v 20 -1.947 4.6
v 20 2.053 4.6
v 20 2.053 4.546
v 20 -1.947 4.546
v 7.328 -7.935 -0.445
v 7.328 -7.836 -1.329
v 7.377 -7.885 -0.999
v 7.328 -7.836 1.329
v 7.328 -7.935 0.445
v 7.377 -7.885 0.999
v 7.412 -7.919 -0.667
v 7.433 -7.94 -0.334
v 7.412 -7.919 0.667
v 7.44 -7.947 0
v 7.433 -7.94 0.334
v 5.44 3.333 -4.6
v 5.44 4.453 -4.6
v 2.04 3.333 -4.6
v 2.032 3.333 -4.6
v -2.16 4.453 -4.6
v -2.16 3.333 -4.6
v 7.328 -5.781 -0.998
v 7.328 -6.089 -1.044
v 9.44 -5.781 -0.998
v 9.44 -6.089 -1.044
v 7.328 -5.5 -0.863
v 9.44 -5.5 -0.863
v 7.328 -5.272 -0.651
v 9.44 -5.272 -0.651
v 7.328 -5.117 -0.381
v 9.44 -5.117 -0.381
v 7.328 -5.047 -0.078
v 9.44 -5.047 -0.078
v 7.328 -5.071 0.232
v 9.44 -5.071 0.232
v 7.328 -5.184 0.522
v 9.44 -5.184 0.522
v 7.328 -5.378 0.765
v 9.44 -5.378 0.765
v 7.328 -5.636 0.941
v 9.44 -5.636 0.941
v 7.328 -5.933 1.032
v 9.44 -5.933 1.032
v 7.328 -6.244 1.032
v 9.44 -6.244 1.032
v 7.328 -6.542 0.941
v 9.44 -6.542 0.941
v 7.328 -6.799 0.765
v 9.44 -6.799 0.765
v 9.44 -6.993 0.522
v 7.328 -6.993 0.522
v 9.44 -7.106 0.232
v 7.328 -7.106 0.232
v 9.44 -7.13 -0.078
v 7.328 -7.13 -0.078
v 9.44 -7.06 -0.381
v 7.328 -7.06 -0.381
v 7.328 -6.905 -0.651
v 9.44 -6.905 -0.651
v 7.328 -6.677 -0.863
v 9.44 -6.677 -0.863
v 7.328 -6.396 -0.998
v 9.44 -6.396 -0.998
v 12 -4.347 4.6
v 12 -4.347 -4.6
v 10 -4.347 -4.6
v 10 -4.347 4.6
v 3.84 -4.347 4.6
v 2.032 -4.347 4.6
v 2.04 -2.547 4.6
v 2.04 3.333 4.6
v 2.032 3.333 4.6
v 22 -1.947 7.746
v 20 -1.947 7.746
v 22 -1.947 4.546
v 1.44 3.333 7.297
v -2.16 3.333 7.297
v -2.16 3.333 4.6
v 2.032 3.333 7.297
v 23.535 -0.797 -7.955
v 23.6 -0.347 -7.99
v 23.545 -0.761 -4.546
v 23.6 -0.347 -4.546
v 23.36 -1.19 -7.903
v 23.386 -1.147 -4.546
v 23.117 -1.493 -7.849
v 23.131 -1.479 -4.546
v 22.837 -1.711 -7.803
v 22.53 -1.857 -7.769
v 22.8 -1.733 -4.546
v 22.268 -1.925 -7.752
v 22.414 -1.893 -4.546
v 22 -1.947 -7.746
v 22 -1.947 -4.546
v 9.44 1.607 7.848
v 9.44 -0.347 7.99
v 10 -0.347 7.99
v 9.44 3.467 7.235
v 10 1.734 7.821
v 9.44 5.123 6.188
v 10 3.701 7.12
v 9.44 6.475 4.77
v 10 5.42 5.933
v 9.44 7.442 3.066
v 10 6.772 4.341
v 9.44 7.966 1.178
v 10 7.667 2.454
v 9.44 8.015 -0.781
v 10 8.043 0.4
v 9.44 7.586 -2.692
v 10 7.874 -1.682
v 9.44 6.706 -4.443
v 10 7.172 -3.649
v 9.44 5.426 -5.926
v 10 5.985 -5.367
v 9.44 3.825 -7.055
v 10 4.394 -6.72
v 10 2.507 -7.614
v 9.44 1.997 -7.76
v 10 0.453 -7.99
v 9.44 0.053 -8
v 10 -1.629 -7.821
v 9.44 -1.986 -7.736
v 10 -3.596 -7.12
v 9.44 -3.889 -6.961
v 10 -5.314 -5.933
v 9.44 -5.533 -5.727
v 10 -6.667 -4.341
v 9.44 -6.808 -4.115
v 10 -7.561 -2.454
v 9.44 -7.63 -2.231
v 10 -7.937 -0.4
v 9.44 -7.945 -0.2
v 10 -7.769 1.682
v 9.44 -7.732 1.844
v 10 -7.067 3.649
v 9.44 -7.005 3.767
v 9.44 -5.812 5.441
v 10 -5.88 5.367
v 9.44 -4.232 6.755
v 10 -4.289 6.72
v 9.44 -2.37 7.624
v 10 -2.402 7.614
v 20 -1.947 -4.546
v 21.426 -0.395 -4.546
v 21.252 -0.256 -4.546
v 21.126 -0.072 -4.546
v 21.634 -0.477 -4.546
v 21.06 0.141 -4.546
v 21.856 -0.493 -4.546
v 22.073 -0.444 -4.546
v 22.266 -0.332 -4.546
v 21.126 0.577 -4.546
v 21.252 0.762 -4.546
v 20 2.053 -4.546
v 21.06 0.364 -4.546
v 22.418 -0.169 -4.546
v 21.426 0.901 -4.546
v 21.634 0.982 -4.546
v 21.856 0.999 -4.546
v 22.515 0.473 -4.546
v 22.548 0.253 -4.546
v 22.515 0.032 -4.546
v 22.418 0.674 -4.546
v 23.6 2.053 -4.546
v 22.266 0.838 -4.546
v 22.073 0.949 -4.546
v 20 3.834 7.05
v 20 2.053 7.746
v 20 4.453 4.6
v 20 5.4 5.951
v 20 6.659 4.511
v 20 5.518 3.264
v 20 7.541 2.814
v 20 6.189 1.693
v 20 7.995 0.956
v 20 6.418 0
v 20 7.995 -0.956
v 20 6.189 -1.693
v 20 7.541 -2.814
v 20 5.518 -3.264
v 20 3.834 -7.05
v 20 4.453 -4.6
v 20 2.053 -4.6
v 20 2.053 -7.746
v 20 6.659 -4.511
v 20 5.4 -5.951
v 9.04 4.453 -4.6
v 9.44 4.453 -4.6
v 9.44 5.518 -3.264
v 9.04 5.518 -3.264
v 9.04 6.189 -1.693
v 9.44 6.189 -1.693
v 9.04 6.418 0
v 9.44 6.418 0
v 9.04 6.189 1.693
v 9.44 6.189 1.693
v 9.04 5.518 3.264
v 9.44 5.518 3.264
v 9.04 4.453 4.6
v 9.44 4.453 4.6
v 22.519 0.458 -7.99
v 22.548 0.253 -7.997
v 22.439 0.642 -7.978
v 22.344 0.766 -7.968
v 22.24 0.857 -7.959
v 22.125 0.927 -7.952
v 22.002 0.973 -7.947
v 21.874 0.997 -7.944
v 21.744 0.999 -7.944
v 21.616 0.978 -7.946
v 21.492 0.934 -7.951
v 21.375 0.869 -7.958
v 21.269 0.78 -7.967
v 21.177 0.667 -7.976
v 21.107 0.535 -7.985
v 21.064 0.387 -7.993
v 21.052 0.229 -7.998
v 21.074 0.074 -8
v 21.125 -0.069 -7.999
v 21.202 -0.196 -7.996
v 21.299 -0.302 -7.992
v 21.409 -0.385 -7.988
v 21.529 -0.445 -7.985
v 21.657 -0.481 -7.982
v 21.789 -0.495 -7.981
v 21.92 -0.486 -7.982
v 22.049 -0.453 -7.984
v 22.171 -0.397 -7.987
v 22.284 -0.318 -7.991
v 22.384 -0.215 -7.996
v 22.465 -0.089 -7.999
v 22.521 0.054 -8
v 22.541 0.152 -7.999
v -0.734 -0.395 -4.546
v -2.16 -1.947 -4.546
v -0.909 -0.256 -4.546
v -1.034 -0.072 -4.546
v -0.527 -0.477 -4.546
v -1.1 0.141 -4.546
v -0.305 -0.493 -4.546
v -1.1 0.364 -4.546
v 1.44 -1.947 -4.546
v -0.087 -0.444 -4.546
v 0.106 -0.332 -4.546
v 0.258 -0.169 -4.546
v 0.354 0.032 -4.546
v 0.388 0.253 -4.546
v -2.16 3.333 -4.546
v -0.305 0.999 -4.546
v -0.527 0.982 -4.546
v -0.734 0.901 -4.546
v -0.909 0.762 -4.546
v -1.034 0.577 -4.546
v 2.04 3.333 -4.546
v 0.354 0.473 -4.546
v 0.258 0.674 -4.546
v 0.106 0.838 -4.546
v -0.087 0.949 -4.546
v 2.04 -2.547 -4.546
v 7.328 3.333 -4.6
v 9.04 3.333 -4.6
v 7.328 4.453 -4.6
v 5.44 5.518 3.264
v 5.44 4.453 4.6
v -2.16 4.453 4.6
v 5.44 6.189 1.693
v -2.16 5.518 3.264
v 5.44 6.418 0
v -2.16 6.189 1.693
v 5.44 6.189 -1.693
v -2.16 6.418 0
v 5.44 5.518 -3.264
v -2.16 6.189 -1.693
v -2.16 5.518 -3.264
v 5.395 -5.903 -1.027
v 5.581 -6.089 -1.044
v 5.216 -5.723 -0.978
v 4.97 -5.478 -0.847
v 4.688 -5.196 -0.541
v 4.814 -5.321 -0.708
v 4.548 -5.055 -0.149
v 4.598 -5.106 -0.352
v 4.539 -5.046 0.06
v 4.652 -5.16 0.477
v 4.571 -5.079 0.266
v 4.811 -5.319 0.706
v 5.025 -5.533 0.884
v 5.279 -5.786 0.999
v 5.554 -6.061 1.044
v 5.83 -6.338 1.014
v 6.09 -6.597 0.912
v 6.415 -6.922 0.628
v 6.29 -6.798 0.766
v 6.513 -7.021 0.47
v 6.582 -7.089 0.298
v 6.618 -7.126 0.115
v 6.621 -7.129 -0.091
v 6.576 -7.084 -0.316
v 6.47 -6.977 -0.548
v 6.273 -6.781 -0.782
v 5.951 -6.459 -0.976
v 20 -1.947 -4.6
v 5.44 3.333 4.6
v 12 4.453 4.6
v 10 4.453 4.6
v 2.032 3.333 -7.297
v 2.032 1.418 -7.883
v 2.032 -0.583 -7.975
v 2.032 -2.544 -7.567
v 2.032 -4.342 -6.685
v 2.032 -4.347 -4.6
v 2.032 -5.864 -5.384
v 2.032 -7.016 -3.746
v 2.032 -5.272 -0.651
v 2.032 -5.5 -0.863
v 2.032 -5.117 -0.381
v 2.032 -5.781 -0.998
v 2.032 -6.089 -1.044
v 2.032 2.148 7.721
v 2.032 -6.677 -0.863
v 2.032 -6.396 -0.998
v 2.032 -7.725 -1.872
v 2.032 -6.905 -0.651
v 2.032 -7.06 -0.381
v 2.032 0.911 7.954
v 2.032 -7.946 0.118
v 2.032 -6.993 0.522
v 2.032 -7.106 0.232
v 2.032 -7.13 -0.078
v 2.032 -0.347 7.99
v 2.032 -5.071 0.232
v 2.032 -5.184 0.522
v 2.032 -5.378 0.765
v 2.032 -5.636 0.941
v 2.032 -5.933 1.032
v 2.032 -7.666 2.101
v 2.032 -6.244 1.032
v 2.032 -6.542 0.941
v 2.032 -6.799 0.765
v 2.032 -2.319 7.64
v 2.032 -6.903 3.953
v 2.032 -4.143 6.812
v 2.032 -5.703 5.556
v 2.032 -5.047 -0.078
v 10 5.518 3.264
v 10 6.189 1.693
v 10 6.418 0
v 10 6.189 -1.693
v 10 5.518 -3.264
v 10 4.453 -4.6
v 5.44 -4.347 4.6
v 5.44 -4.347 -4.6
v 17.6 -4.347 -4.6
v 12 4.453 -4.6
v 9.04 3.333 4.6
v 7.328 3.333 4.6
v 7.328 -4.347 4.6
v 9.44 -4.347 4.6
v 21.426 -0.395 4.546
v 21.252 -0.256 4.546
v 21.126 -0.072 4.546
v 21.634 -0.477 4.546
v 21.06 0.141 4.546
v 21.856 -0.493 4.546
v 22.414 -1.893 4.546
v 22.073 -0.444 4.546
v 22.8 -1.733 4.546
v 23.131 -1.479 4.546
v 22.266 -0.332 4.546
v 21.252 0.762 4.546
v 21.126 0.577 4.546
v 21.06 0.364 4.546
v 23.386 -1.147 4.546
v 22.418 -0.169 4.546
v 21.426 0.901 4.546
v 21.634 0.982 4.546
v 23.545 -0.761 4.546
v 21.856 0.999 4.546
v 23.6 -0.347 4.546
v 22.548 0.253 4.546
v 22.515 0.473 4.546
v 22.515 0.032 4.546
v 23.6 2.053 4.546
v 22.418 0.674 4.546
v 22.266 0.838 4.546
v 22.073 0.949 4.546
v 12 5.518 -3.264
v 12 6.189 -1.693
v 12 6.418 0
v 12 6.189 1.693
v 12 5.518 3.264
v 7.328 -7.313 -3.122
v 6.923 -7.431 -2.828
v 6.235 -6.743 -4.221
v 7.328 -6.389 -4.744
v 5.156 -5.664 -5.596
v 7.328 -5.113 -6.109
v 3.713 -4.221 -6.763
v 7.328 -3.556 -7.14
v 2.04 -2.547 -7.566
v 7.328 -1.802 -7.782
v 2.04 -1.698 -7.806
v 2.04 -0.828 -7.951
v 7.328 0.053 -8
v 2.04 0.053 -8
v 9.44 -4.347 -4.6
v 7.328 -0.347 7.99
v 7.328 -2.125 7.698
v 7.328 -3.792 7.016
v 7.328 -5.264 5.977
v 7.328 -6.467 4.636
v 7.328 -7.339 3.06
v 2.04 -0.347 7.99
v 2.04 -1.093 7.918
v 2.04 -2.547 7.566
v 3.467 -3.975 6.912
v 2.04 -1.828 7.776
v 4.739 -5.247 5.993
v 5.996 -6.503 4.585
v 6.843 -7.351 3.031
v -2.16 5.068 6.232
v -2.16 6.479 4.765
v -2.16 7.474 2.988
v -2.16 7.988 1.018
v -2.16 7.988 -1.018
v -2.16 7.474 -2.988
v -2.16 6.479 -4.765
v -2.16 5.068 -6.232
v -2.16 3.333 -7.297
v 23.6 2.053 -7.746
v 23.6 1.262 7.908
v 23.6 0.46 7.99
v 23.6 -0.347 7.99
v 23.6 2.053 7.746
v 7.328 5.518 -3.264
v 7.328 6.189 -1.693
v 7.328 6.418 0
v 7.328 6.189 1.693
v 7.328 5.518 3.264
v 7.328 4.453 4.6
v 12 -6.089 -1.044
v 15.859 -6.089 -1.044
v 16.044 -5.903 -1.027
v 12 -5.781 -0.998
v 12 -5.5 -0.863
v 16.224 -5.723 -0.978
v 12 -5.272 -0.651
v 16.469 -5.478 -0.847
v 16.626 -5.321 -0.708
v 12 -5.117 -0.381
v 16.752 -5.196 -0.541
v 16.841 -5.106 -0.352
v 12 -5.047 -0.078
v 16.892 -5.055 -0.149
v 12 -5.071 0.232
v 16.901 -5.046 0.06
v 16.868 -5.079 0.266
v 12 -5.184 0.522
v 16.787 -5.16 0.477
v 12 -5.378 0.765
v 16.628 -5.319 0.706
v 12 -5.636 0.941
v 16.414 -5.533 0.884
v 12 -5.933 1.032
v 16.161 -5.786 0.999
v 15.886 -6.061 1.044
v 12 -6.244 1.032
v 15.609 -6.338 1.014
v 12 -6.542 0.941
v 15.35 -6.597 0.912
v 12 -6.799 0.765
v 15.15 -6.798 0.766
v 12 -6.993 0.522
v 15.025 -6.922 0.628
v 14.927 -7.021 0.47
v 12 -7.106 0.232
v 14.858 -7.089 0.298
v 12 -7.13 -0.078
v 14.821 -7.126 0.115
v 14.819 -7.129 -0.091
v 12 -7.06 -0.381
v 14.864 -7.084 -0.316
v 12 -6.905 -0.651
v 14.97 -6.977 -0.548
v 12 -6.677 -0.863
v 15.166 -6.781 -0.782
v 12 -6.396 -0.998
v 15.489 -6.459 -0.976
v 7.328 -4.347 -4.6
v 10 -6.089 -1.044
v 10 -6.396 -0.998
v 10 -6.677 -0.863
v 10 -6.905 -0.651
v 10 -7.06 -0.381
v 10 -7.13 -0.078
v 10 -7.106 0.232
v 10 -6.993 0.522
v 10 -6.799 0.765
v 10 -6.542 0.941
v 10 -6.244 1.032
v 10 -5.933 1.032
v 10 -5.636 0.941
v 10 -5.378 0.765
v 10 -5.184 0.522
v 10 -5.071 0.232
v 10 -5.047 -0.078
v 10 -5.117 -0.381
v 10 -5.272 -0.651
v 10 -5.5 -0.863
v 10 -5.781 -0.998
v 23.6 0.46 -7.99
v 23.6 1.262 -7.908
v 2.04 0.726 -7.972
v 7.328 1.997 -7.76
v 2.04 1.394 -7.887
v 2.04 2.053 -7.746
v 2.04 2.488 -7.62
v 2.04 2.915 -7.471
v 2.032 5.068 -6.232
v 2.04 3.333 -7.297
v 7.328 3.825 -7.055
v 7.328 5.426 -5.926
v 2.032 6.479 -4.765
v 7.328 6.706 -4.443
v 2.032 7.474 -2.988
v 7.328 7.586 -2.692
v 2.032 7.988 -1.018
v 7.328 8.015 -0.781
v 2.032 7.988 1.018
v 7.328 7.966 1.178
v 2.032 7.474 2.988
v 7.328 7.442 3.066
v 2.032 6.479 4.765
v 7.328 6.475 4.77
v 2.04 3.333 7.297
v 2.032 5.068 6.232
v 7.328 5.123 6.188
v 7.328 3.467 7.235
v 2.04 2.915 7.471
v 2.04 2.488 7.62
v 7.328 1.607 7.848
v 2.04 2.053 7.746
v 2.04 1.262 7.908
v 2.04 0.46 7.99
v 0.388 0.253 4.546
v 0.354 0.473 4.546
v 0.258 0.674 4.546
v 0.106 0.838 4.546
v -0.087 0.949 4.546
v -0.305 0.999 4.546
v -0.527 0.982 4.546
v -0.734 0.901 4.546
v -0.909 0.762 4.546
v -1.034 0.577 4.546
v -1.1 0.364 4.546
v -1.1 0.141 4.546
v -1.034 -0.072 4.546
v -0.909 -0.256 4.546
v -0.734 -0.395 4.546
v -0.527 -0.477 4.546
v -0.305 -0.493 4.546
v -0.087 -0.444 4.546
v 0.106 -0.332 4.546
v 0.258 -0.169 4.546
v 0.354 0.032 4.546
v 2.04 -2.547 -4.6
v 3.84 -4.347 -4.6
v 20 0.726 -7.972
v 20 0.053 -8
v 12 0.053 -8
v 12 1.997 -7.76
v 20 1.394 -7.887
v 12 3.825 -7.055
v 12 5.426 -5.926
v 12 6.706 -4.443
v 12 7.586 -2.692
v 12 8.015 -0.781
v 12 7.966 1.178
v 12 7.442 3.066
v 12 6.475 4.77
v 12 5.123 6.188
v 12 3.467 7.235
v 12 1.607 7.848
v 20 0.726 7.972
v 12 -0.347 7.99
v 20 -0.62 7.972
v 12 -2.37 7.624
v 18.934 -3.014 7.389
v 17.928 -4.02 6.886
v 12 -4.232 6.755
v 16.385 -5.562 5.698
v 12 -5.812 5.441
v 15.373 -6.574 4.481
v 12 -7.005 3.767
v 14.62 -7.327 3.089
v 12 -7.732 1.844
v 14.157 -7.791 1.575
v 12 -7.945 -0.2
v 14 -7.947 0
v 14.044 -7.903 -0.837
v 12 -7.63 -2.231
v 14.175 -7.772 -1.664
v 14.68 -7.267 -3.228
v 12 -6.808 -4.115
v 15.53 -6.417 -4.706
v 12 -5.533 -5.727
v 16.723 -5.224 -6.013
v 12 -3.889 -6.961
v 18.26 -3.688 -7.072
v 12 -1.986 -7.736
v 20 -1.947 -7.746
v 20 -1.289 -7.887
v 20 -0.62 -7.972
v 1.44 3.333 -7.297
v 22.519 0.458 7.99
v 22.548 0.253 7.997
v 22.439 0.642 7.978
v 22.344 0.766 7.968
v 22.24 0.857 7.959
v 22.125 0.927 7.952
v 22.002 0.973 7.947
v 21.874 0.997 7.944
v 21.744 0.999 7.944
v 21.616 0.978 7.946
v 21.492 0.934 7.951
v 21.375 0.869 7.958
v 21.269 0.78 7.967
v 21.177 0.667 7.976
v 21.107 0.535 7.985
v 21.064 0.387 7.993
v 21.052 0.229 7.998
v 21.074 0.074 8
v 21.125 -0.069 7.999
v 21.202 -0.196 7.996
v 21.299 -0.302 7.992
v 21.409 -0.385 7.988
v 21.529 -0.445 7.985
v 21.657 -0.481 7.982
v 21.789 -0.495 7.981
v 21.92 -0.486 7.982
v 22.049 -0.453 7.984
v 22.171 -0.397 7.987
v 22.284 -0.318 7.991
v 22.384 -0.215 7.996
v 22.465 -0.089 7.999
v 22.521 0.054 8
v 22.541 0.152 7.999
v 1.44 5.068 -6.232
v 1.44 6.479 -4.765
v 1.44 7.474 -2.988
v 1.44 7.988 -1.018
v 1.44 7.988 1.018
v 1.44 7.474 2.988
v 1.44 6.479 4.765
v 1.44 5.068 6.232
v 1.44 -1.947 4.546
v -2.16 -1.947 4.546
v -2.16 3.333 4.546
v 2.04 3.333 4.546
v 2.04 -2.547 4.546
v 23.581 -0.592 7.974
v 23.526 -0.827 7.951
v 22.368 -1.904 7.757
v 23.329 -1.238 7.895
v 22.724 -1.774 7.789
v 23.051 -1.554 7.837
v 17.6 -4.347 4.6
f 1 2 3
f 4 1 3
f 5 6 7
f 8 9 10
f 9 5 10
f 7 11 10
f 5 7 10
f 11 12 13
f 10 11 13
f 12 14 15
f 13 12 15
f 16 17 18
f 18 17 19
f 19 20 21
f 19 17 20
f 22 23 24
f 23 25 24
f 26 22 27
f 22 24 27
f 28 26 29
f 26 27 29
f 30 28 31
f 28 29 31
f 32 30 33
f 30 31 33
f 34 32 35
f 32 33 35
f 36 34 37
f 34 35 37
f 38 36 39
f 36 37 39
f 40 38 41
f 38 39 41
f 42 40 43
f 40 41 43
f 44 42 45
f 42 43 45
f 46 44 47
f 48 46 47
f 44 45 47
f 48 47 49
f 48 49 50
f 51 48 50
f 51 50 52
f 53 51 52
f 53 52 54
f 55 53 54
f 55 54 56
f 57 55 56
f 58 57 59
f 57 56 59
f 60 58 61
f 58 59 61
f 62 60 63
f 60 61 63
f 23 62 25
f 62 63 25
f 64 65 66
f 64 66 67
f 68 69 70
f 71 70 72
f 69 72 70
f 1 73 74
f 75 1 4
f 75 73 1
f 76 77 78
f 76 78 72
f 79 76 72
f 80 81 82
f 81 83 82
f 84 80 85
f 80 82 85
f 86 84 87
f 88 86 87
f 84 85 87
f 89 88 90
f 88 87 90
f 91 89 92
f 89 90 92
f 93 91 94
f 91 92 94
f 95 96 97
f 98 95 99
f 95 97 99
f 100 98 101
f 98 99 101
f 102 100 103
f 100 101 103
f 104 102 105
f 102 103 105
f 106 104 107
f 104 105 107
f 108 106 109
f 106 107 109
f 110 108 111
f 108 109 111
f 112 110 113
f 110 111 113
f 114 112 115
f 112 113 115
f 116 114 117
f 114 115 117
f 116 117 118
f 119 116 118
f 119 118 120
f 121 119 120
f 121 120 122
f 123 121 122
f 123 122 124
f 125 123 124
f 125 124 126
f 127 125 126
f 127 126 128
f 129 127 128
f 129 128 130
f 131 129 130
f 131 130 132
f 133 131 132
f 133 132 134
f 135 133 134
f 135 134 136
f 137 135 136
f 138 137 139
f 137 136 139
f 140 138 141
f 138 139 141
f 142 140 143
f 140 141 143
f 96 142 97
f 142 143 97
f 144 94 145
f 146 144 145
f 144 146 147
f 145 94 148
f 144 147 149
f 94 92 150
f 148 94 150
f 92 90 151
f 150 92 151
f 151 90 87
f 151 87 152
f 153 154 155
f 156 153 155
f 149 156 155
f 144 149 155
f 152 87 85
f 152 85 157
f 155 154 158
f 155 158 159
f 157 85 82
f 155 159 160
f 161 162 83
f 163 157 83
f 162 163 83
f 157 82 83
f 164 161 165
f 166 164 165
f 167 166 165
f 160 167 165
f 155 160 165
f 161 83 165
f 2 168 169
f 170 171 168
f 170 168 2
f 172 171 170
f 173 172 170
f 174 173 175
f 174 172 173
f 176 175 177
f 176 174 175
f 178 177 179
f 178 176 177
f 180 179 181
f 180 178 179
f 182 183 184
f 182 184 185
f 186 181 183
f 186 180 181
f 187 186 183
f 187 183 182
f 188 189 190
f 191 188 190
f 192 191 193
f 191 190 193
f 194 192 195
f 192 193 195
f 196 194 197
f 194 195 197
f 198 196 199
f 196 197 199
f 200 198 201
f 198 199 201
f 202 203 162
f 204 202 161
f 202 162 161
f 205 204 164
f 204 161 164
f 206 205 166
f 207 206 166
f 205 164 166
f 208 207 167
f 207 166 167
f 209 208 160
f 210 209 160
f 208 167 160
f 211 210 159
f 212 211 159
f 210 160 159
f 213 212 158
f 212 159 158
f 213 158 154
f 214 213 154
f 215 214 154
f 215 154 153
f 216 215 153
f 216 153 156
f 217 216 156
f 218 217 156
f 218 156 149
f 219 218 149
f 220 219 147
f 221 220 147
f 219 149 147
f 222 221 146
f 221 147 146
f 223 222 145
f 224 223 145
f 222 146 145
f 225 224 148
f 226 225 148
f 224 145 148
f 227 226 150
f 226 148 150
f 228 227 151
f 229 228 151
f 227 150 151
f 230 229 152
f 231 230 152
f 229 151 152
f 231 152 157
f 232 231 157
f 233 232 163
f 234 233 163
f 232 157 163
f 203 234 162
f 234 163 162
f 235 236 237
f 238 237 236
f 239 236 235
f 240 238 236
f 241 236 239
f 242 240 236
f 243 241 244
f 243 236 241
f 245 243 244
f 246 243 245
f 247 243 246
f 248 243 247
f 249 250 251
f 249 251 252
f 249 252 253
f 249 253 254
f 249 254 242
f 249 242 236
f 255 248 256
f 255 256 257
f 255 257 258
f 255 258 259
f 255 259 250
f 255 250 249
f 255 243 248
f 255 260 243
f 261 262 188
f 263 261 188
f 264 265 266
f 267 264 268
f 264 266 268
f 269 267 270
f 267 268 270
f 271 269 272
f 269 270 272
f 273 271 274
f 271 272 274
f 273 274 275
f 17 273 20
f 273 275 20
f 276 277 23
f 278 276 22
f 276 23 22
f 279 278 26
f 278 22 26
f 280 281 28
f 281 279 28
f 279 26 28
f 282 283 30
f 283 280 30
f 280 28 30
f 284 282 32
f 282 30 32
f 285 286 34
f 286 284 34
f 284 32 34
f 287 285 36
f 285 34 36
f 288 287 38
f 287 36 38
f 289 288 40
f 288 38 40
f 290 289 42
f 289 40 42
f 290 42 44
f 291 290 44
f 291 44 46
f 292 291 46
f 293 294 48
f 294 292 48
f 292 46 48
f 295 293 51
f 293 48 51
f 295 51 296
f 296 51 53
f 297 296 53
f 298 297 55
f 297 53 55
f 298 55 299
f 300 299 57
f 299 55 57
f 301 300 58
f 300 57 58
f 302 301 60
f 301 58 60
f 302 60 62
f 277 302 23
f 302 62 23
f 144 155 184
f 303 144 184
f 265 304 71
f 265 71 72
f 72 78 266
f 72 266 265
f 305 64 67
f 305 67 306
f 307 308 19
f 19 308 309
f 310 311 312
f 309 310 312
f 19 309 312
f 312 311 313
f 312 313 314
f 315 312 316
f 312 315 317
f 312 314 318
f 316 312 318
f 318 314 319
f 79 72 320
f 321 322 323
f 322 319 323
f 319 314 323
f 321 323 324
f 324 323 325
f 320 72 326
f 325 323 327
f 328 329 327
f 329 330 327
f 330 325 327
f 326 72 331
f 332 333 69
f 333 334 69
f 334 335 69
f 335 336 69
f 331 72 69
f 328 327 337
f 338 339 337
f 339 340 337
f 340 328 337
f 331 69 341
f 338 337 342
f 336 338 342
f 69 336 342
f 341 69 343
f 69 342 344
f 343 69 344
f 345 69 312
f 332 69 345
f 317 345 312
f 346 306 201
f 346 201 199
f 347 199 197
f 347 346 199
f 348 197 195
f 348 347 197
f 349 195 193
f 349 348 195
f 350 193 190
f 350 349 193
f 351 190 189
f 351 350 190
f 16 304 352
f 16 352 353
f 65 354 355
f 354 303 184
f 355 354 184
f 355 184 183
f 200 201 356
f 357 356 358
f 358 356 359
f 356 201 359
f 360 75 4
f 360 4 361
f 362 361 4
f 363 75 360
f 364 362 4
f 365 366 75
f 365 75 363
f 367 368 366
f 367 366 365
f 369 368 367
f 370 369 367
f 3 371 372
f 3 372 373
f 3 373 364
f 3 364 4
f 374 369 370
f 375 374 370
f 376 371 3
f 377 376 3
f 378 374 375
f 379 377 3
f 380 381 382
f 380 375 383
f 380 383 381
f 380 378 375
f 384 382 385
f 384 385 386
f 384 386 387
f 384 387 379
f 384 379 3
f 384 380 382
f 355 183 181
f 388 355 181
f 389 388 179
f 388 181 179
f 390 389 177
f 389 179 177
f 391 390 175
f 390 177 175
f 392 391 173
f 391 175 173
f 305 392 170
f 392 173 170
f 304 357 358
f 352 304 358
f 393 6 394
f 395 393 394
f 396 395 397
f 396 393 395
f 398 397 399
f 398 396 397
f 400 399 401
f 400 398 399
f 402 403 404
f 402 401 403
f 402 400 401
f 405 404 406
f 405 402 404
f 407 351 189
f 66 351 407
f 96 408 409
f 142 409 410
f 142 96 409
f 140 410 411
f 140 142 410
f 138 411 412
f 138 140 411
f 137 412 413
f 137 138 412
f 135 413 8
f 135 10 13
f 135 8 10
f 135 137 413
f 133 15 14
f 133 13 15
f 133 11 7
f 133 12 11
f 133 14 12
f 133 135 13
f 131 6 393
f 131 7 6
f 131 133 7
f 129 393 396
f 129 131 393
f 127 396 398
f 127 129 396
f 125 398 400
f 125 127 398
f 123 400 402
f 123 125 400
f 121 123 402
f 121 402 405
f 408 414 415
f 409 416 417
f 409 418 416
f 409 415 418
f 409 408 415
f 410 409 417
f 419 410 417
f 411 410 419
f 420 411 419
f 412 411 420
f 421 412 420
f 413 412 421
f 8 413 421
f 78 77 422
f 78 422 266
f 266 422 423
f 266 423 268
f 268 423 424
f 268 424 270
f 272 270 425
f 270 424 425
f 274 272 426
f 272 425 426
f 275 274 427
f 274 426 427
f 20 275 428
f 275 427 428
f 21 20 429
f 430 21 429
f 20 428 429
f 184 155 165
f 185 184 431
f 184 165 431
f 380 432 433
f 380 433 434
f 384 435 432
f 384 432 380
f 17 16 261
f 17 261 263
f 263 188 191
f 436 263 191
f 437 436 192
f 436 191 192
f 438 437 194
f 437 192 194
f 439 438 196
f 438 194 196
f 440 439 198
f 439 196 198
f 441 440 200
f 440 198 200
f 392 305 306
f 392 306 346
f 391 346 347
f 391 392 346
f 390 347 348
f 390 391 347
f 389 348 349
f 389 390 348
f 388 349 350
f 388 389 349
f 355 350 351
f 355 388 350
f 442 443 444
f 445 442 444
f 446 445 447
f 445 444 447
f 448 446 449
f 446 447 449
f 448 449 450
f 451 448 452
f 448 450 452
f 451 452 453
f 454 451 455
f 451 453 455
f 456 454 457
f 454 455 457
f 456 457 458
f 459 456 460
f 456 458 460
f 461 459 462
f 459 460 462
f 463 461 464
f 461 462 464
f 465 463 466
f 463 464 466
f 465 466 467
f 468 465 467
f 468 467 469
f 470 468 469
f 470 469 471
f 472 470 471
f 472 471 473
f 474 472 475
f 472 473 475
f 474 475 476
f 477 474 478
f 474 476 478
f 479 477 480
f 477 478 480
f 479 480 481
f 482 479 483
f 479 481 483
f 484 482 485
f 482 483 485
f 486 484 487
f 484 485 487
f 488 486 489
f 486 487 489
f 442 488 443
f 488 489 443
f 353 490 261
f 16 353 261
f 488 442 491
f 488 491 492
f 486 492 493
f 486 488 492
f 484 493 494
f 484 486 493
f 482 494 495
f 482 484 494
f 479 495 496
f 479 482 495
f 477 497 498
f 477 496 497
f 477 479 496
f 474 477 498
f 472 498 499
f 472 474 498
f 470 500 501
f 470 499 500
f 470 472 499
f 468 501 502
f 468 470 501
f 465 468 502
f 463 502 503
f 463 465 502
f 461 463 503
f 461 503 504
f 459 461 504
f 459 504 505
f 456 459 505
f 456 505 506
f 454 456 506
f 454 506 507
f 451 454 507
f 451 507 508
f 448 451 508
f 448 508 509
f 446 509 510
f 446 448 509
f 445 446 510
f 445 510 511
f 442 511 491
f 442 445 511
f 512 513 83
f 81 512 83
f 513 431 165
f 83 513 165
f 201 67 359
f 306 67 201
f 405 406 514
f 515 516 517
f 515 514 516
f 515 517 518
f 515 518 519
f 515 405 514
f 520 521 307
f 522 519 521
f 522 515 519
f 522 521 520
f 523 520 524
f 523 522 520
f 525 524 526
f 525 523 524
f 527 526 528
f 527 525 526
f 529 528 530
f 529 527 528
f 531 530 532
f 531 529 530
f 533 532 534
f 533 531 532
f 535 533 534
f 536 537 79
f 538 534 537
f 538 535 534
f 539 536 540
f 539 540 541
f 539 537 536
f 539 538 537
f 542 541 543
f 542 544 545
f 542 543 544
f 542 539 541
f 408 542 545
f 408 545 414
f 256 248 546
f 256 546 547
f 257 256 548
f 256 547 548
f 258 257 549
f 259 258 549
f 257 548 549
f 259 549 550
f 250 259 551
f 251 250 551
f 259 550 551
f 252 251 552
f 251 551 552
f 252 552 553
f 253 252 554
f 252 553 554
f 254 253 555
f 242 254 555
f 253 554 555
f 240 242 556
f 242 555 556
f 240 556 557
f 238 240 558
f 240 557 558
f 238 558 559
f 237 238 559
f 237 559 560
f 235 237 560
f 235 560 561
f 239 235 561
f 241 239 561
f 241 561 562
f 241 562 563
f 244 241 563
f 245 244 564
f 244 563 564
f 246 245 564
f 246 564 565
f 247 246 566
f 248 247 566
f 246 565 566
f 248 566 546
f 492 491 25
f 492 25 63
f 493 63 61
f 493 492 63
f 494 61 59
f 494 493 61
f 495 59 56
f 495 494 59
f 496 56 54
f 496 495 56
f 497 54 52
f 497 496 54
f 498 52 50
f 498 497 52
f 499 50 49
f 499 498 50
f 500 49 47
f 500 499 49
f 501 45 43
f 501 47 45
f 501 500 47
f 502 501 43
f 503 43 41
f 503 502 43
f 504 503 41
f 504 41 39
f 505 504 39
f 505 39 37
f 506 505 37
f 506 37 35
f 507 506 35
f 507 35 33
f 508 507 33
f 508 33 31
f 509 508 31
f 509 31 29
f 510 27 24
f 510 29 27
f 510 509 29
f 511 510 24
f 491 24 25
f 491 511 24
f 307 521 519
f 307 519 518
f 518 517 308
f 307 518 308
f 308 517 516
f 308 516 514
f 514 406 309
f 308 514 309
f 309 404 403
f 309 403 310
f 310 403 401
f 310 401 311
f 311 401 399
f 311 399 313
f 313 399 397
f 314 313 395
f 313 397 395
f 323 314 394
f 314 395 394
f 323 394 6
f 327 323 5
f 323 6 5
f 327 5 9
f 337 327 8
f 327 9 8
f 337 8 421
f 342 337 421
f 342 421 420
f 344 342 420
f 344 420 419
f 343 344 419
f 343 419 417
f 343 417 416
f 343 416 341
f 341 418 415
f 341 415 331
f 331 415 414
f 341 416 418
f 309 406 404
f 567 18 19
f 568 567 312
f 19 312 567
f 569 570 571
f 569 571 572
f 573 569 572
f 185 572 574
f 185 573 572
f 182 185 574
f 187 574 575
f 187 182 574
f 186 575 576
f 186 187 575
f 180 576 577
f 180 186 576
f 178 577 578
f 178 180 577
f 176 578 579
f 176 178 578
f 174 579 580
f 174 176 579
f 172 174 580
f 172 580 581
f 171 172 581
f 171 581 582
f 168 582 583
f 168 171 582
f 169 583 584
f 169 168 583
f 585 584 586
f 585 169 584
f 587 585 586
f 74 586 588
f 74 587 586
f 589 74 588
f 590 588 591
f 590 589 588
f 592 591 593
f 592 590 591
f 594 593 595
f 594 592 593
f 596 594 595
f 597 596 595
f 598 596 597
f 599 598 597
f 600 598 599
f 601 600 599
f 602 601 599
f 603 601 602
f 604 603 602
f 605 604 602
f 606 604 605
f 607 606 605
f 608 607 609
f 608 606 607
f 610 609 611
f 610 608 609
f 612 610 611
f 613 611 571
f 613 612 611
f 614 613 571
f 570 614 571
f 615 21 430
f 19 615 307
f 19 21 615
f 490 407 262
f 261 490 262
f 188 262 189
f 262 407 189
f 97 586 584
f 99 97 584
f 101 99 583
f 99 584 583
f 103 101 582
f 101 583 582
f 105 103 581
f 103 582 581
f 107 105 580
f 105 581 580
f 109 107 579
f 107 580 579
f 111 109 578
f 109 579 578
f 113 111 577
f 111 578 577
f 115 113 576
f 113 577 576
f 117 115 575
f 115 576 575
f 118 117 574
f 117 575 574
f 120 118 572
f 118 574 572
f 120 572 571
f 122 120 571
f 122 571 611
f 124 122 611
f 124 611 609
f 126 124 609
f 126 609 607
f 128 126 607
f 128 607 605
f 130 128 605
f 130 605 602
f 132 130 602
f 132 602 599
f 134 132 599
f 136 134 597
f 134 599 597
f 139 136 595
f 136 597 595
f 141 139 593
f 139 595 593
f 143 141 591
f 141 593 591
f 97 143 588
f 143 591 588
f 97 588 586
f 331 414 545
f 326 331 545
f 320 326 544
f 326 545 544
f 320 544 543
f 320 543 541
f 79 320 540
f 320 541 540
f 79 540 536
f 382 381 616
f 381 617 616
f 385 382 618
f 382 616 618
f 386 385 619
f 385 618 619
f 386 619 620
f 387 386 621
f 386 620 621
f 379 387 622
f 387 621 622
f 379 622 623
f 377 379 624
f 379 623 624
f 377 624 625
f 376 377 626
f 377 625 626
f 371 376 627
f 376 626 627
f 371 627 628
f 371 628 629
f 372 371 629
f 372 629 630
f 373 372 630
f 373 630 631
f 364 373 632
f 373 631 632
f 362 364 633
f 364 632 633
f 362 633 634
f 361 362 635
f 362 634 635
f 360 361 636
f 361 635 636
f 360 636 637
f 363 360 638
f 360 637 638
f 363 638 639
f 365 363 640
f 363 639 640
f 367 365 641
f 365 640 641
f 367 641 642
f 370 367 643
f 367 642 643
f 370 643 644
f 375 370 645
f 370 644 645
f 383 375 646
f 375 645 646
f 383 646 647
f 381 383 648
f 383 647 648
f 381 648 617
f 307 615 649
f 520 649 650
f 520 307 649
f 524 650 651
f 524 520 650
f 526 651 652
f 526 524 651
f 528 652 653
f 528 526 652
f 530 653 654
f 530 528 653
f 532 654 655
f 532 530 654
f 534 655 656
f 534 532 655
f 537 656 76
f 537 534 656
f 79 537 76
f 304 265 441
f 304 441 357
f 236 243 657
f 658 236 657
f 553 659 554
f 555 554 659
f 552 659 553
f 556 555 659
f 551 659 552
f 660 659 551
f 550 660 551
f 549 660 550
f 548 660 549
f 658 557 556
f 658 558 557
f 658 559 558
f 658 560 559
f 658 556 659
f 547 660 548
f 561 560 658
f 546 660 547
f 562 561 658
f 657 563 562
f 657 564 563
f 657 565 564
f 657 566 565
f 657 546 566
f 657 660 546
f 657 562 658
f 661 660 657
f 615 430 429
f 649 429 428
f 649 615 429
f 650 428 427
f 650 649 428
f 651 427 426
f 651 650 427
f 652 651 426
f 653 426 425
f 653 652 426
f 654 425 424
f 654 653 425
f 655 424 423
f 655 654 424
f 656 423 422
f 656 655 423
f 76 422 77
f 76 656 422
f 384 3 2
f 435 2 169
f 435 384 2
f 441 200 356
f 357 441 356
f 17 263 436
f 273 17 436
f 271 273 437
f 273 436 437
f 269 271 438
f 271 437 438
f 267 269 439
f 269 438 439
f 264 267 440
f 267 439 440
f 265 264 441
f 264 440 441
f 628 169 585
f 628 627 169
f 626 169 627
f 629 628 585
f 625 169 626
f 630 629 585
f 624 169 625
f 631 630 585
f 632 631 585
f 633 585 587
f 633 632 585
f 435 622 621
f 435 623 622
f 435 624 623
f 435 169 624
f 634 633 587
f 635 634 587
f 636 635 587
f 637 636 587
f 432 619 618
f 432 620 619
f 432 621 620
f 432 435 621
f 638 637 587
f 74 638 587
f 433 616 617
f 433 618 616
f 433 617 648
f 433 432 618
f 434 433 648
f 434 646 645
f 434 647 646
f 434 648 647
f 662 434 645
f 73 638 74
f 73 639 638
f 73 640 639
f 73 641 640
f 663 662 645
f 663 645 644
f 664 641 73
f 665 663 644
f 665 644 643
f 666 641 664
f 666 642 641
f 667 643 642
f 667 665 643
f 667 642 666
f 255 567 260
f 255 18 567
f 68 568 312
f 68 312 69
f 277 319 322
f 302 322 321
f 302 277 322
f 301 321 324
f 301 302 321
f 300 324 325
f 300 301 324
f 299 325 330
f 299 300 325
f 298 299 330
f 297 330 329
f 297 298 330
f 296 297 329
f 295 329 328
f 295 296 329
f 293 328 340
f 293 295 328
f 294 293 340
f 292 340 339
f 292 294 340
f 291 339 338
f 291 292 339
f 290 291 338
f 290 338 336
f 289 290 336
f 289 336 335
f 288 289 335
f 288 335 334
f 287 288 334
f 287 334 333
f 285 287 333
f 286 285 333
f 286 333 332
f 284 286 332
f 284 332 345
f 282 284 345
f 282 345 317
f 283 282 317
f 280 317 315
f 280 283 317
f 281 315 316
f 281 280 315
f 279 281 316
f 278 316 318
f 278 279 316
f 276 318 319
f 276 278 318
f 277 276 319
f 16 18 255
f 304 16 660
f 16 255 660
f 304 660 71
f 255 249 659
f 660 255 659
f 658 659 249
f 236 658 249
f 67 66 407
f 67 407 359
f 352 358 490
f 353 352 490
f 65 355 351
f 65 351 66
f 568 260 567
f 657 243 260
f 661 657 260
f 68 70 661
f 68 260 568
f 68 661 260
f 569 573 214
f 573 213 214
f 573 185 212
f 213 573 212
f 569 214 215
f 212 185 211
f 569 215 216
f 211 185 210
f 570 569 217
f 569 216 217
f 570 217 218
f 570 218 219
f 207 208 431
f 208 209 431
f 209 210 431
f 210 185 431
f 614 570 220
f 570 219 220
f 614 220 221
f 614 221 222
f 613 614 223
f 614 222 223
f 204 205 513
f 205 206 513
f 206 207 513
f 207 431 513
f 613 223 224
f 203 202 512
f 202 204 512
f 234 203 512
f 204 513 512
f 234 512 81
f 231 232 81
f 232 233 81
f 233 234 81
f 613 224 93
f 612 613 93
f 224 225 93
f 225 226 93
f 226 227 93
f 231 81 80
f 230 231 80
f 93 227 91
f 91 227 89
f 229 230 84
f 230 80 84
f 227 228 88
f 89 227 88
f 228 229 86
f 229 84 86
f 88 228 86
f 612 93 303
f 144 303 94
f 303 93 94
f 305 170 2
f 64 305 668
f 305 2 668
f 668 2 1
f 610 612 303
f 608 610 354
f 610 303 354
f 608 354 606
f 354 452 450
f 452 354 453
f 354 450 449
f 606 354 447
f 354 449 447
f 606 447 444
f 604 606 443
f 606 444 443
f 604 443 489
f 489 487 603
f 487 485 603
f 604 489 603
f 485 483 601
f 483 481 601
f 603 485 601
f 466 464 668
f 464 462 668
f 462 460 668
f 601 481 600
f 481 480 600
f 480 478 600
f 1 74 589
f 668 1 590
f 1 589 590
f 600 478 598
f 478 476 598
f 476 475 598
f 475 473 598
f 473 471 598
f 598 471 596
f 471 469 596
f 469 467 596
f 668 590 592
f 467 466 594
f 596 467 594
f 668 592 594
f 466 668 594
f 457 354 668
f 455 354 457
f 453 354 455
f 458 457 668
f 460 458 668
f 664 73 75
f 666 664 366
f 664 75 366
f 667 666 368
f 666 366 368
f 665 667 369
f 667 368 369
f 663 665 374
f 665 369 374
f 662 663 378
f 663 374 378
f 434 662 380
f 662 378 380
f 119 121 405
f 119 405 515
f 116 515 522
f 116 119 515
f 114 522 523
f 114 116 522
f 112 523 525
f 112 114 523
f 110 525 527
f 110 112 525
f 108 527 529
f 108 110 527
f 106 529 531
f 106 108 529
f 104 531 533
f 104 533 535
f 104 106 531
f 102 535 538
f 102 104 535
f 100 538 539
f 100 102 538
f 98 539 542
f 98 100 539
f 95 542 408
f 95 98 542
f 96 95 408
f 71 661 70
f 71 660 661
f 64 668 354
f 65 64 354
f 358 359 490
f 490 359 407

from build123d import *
from build123d.topology import SkipClean

# Parameters (mm, degrees)
SKETCH1_R           = 10
BOSS_EXTRUDE1_DEPTH = 10
SKETCH4_R           = 1.305
CUT_EXTRUDE3_DEPTH  = 25.5
BOSS_EXTRUDE2_START = 4.5
BOSS_EXTRUDE2_DEPTH = 4.5
SKETCH6_R           = 0.935
CUT_EXTRUDE4_DEPTH  = 12.25
SKETCH7_W           = 11.364916732
SKETCH7_H           = 5
BOSS_EXTRUDE3_DEPTH = 4.5
SKETCH8_R           = 0.935
CUT_EXTRUDE5_DEPTH  = 7.25
BOSS_EXTRUDE4_DEPTH = 4.5
CUT_EXTRUDE6_START  = -0.75
CUT_EXTRUDE6_DEPTH  = 0.75
SKETCH12_W          = 5.25
SKETCH12_H          = 4
CUT_EXTRUDE7_DEPTH  = 1.6
CUT_EXTRUDE8_DEPTH  = 15.8
FILLET1_R           = 2
CUT_EXTRUDE9_DEPTH  = 10.8
SKETCH15_W          = 11.364916732
SKETCH15_H          = 6.6
CUT_EXTRUDE10_DEPTH = 1.6
CUT_EXTRUDE11_DEPTH = 15
BOSS_EXTRUDE5_REACH = 35.438
SKETCH17_R          = 10
SKETCH17_R_2        = 1.305
CUT_EXTRUDE12_DEPTH = 14
SCALE1_SCALE        = 0.8


with BuildPart() as part:
    # Sketch1 → Boss-Extrude1 (new, symmetric)
    with BuildSketch(Plane(origin=(0, 0, 0), x_dir=(0, 0, -1), z_dir=(1, 0, 0))):
        Circle(SKETCH1_R)
    extrude(amount=BOSS_EXTRUDE1_DEPTH, both=True)

    # Sketch4 → Cut-Extrude3 (cut, symmetric)
    with BuildSketch(Plane(origin=(0, -0.76336978, 0), x_dir=(0, 0, -1), z_dir=(1, 0, 0))):
        with Locations((0, -6.913267104)):
            Circle(SKETCH4_R)
    extrude(amount=CUT_EXTRUDE3_DEPTH, both=True, mode=Mode.SUBTRACT)

    # Sketch5 → Boss-Extrude2 (add)
    with BuildSketch(Plane(origin=(10, 0, 0), x_dir=(0, 0, -1), z_dir=(1, 0, 0)).offset(BOSS_EXTRUDE2_START)):
        with BuildLine():
            Line((-9.682458366, -2.5), (-5.682458366, -2.5))
            Line((-5.682458366, -2.5), (-5.682458366, 2.5))
            Line((-5.682458366, 2.5), (-9.682458366, 2.5))
            ThreePointArc((-9.682458366, 2.5), (-10, 0), (-9.682458366, -2.5))
        make_face()
    boss_extrude2 = extrude(amount=-BOSS_EXTRUDE2_DEPTH)

    # Mirror1: Boss-Extrude2 across plane
    add(boss_extrude2.mirror(Plane.XY))

    # Sketch6 → Cut-Extrude4 (cut, symmetric)
    with SkipClean():  # the faces are left unmerged after this step: merging them gives an invalid solid
        with BuildSketch(Plane.XY):
            with Locations((12.25, 0.25)):
                Circle(SKETCH6_R)
        extrude(amount=CUT_EXTRUDE4_DEPTH, both=True, mode=Mode.SUBTRACT)

    # Sketch7 → Boss-Extrude3 (add)
    with SkipClean():  # the faces are left unmerged after this step: merging them gives an invalid solid
        with BuildSketch(Plane.ZY.offset(10)):
            Rectangle(SKETCH7_W, SKETCH7_H)
        extrude(amount=BOSS_EXTRUDE3_DEPTH)

    # Sketch8 → Cut-Extrude5 (cut, symmetric)
    with SkipClean():  # the faces are left unmerged after this step: merging them gives an invalid solid
        with BuildSketch(Plane.XY):
            with Locations((-12.25, 0.25)):
                Circle(SKETCH8_R)
        extrude(amount=CUT_EXTRUDE5_DEPTH, both=True, mode=Mode.SUBTRACT)

    # Sketch10 → Boss-Extrude4 (add)
    with SkipClean():  # the faces are left unmerged after this step: merging them gives an invalid solid
        with BuildSketch(Plane.ZY.offset(10)):
            with BuildLine():
                Line((9.682458366, 2.5), (-9.682458366, 2.5))
                ThreePointArc((-9.682458366, 2.5), (0, 10), (9.682458366, 2.5))
            make_face()
        extrude(amount=BOSS_EXTRUDE4_DEPTH)

    # Cut-Extrude6: read off the stored shape, not the designer's step
    # Cut-Extrude6 outline → Cut-Extrude6 (cut)
    with SkipClean():  # the faces are left unmerged after this step: merging them gives an invalid solid
        with BuildSketch(Plane.ZY.offset(10).offset(CUT_EXTRUDE6_START)):
            with BuildLine():
                ThreePointArc((-9.682458366, 2.5), (-9.369942303, -3.493448331), (-5.682458366, -8.228588392))
                Line((-5.682458366, -8.228588392), (-5.682458366, 2.5))
                Line((-5.682458366, 2.5), (-9.682458366, 2.5))
            make_face()
            with BuildLine():
                Line((5.682458366, 2.5), (5.682458366, -8.228588392))
                ThreePointArc((5.682458366, -8.228588392), (9.369942303, -3.493448331), (9.682458366, 2.5))
                Line((9.682458366, 2.5), (5.682458366, 2.5))
            make_face()
        extrude(amount=CUT_EXTRUDE6_DEPTH, mode=Mode.SUBTRACT)

    # Sketch12 → Cut-Extrude7 (cut)
    with SkipClean():  # the faces are left unmerged after this step: merging them gives an invalid solid
        with BuildSketch(Plane.XZ.offset(-2.5)):
            with Locations((-11.875, -7.682458366)):
                Rectangle(SKETCH12_W, SKETCH12_H)
            with Locations((-11.875, 7.682458366)):
                Rectangle(SKETCH12_W, SKETCH12_H)
        extrude(amount=-CUT_EXTRUDE7_DEPTH, mode=Mode.SUBTRACT)

    # Sketch13 → Cut-Extrude8 (cut, symmetric)
    with SkipClean():  # the faces are left unmerged after this step: merging them gives an invalid solid
        with BuildSketch(Plane.XY):
            Polygon((-10, -8.228588392), (-10, -2.5), (-2.5, -10), (-10, -10), align=None)
        extrude(amount=CUT_EXTRUDE8_DEPTH, both=True, mode=Mode.SUBTRACT)

    # Fillet1
    fillet1_edges = [part.edges().sort_by_distance(p)[0] for p in [
        (14.5, -2.5, 7.682458366),
        (14.5, -2.5, -7.682458366),
    ]]
    fillet(fillet1_edges, radius=FILLET1_R)

    # Sketch14 → Cut-Extrude9 (cut, symmetric)
    with SkipClean():  # the faces are left unmerged after this step: merging them gives an invalid solid
        with BuildSketch(Plane.XY):
            Polygon((10, -10), (10, -2.5), (2.5, -10), align=None)
        extrude(amount=CUT_EXTRUDE9_DEPTH, both=True, mode=Mode.SUBTRACT)

    # Sketch15 → Cut-Extrude10 (cut)
    with SkipClean():  # the faces are left unmerged after this step: merging them gives an invalid solid
        with BuildSketch(Plane(origin=(10, 0, 0), x_dir=(0, 0, -1), z_dir=(1, 0, 0))):
            with Locations((0, -0.8)):
                Rectangle(SKETCH15_W, SKETCH15_H)
        extrude(amount=-CUT_EXTRUDE10_DEPTH, mode=Mode.SUBTRACT)

    # Sketch16 → Cut-Extrude11 (cut)
    with SkipClean():  # the faces are left unmerged after this step: merging them gives an invalid solid
        with BuildSketch(Plane(origin=(10, 0, 0), x_dir=(0, 0, -1), z_dir=(1, 0, 0))):
            with BuildLine():
                Line((-5.75, 5.5), (-5.75, -5.5))
                Line((-5.75, -5.5), (5.75, -5.5))
                Line((5.75, -5.5), (5.75, 5.5))
                ThreePointArc((5.75, 5.5), (0, 7.956915231), (-5.75, 5.5))
            make_face()
        extrude(amount=-CUT_EXTRUDE11_DEPTH, mode=Mode.SUBTRACT)


with BuildPart() as body_2:
    # Split1: the piece on the far side of the plane
    add(part.part)
    split(bisect_by=Plane(origin=(0, 0, 0), x_dir=(0, 0, 1), z_dir=(1, 0, 0)), keep=Keep.BOTTOM)


with BuildPart() as part_1:
    add(part.part)

    # Split1
    split(bisect_by=Plane(origin=(0, 0, 0), x_dir=(0, 0, 1), z_dir=(1, 0, 0)), keep=Keep.TOP)


with BuildPart() as part_2:
    # Body-Move/Copy1: moved
    add(part_1.part.moved(Location((15.8, 0, 0))))


    # Sketch17 → Boss-Extrude5 (add, up to next)
    with BuildSketch(Plane.ZY.offset(-15.8), mode=Mode.PRIVATE) as boss_extrude5_sk1:
        with Locations(Location((0, 0, 0), (0, 0, 357.134016017))):
            Circle(SKETCH17_R)
        with Locations(Location((0, -7.676636884, 0), (0, 0, 180))):
            Circle(SKETCH17_R_2, mode=Mode.SUBTRACT)
        with BuildLine():
            Line((-5.75, -5.5), (5.75, -5.5))
            Line((5.75, -5.5), (5.75, 5.5))
            ThreePointArc((5.75, 5.5), (0, 7.956915231), (-5.75, 5.5))
            Line((-5.75, 5.5), (-5.75, -5.5))
        make_face(mode=Mode.SUBTRACT)
    boss_extrude5_tool1 = extrude(boss_extrude5_sk1.sketch, amount=BOSS_EXTRUDE5_REACH, mode=Mode.PRIVATE) - body_2.part
    add(boss_extrude5_tool1.solids().sort_by_distance((15.8, 0.485858, -9.705003))[0])


with BuildPart() as body_2_1:
    # Body-Move/Copy2: moved
    add(body_2.part.moved(Location((9.26, 0, 0))))

    # Combine4: union part
    add(part_2.part)

    # Sketch18 → Cut-Extrude12 (cut)
    with SkipClean():  # the faces are left unmerged after this step: merging them gives an invalid solid
        with BuildSketch(Plane.ZY.offset(5.24)):
            with BuildLine():
                Line((-5.75, 5.5), (-5.75, 4.1))
                Line((-5.75, 4.1), (5.75, 4.1))
                Line((5.75, 4.1), (5.75, 5.5))
                ThreePointArc((5.75, 5.5), (0, 7.956915231), (-5.75, 5.5))
            make_face()
        extrude(amount=-CUT_EXTRUDE12_DEPTH, mode=Mode.SUBTRACT)


with BuildPart() as body_2_2:
    # Scale1: scaled about (10.157754057, 0.26372377, 1.86e-07)
    add(body_2_1.part.scale(SCALE1_SCALE).moved(Location((2.031550811, 0.052744754, 3.7e-08))))


with BuildPart() as body_2_2_1:
    # Split2: the piece on the far side of the plane
    add(body_2_2.part)
    split(bisect_by=Plane(origin=(10, 0, 0), x_dir=(0, 0, 1), z_dir=(1, 0, 0)), keep=Keep.BOTTOM)


with BuildPart() as body_2_3:
    add(body_2_2.part)

    # Split2
    split(bisect_by=Plane(origin=(10, 0, 0), x_dir=(0, 0, 1), z_dir=(1, 0, 0)), keep=Keep.TOP)


with BuildPart() as body_2_4:
    # Body-Move/Copy3: read off the stored shape, not the designer's step
    # Body-Move/Copy3: moved
    add(body_2_3.part.moved(Location((-2.6715551, 0, 0))))


with BuildPart() as body_2_2_2:
    add(body_2_2_1.part)

    # Combine5: union body 2
    add(body_2_4.part)


solid = body_2_2_2.part
